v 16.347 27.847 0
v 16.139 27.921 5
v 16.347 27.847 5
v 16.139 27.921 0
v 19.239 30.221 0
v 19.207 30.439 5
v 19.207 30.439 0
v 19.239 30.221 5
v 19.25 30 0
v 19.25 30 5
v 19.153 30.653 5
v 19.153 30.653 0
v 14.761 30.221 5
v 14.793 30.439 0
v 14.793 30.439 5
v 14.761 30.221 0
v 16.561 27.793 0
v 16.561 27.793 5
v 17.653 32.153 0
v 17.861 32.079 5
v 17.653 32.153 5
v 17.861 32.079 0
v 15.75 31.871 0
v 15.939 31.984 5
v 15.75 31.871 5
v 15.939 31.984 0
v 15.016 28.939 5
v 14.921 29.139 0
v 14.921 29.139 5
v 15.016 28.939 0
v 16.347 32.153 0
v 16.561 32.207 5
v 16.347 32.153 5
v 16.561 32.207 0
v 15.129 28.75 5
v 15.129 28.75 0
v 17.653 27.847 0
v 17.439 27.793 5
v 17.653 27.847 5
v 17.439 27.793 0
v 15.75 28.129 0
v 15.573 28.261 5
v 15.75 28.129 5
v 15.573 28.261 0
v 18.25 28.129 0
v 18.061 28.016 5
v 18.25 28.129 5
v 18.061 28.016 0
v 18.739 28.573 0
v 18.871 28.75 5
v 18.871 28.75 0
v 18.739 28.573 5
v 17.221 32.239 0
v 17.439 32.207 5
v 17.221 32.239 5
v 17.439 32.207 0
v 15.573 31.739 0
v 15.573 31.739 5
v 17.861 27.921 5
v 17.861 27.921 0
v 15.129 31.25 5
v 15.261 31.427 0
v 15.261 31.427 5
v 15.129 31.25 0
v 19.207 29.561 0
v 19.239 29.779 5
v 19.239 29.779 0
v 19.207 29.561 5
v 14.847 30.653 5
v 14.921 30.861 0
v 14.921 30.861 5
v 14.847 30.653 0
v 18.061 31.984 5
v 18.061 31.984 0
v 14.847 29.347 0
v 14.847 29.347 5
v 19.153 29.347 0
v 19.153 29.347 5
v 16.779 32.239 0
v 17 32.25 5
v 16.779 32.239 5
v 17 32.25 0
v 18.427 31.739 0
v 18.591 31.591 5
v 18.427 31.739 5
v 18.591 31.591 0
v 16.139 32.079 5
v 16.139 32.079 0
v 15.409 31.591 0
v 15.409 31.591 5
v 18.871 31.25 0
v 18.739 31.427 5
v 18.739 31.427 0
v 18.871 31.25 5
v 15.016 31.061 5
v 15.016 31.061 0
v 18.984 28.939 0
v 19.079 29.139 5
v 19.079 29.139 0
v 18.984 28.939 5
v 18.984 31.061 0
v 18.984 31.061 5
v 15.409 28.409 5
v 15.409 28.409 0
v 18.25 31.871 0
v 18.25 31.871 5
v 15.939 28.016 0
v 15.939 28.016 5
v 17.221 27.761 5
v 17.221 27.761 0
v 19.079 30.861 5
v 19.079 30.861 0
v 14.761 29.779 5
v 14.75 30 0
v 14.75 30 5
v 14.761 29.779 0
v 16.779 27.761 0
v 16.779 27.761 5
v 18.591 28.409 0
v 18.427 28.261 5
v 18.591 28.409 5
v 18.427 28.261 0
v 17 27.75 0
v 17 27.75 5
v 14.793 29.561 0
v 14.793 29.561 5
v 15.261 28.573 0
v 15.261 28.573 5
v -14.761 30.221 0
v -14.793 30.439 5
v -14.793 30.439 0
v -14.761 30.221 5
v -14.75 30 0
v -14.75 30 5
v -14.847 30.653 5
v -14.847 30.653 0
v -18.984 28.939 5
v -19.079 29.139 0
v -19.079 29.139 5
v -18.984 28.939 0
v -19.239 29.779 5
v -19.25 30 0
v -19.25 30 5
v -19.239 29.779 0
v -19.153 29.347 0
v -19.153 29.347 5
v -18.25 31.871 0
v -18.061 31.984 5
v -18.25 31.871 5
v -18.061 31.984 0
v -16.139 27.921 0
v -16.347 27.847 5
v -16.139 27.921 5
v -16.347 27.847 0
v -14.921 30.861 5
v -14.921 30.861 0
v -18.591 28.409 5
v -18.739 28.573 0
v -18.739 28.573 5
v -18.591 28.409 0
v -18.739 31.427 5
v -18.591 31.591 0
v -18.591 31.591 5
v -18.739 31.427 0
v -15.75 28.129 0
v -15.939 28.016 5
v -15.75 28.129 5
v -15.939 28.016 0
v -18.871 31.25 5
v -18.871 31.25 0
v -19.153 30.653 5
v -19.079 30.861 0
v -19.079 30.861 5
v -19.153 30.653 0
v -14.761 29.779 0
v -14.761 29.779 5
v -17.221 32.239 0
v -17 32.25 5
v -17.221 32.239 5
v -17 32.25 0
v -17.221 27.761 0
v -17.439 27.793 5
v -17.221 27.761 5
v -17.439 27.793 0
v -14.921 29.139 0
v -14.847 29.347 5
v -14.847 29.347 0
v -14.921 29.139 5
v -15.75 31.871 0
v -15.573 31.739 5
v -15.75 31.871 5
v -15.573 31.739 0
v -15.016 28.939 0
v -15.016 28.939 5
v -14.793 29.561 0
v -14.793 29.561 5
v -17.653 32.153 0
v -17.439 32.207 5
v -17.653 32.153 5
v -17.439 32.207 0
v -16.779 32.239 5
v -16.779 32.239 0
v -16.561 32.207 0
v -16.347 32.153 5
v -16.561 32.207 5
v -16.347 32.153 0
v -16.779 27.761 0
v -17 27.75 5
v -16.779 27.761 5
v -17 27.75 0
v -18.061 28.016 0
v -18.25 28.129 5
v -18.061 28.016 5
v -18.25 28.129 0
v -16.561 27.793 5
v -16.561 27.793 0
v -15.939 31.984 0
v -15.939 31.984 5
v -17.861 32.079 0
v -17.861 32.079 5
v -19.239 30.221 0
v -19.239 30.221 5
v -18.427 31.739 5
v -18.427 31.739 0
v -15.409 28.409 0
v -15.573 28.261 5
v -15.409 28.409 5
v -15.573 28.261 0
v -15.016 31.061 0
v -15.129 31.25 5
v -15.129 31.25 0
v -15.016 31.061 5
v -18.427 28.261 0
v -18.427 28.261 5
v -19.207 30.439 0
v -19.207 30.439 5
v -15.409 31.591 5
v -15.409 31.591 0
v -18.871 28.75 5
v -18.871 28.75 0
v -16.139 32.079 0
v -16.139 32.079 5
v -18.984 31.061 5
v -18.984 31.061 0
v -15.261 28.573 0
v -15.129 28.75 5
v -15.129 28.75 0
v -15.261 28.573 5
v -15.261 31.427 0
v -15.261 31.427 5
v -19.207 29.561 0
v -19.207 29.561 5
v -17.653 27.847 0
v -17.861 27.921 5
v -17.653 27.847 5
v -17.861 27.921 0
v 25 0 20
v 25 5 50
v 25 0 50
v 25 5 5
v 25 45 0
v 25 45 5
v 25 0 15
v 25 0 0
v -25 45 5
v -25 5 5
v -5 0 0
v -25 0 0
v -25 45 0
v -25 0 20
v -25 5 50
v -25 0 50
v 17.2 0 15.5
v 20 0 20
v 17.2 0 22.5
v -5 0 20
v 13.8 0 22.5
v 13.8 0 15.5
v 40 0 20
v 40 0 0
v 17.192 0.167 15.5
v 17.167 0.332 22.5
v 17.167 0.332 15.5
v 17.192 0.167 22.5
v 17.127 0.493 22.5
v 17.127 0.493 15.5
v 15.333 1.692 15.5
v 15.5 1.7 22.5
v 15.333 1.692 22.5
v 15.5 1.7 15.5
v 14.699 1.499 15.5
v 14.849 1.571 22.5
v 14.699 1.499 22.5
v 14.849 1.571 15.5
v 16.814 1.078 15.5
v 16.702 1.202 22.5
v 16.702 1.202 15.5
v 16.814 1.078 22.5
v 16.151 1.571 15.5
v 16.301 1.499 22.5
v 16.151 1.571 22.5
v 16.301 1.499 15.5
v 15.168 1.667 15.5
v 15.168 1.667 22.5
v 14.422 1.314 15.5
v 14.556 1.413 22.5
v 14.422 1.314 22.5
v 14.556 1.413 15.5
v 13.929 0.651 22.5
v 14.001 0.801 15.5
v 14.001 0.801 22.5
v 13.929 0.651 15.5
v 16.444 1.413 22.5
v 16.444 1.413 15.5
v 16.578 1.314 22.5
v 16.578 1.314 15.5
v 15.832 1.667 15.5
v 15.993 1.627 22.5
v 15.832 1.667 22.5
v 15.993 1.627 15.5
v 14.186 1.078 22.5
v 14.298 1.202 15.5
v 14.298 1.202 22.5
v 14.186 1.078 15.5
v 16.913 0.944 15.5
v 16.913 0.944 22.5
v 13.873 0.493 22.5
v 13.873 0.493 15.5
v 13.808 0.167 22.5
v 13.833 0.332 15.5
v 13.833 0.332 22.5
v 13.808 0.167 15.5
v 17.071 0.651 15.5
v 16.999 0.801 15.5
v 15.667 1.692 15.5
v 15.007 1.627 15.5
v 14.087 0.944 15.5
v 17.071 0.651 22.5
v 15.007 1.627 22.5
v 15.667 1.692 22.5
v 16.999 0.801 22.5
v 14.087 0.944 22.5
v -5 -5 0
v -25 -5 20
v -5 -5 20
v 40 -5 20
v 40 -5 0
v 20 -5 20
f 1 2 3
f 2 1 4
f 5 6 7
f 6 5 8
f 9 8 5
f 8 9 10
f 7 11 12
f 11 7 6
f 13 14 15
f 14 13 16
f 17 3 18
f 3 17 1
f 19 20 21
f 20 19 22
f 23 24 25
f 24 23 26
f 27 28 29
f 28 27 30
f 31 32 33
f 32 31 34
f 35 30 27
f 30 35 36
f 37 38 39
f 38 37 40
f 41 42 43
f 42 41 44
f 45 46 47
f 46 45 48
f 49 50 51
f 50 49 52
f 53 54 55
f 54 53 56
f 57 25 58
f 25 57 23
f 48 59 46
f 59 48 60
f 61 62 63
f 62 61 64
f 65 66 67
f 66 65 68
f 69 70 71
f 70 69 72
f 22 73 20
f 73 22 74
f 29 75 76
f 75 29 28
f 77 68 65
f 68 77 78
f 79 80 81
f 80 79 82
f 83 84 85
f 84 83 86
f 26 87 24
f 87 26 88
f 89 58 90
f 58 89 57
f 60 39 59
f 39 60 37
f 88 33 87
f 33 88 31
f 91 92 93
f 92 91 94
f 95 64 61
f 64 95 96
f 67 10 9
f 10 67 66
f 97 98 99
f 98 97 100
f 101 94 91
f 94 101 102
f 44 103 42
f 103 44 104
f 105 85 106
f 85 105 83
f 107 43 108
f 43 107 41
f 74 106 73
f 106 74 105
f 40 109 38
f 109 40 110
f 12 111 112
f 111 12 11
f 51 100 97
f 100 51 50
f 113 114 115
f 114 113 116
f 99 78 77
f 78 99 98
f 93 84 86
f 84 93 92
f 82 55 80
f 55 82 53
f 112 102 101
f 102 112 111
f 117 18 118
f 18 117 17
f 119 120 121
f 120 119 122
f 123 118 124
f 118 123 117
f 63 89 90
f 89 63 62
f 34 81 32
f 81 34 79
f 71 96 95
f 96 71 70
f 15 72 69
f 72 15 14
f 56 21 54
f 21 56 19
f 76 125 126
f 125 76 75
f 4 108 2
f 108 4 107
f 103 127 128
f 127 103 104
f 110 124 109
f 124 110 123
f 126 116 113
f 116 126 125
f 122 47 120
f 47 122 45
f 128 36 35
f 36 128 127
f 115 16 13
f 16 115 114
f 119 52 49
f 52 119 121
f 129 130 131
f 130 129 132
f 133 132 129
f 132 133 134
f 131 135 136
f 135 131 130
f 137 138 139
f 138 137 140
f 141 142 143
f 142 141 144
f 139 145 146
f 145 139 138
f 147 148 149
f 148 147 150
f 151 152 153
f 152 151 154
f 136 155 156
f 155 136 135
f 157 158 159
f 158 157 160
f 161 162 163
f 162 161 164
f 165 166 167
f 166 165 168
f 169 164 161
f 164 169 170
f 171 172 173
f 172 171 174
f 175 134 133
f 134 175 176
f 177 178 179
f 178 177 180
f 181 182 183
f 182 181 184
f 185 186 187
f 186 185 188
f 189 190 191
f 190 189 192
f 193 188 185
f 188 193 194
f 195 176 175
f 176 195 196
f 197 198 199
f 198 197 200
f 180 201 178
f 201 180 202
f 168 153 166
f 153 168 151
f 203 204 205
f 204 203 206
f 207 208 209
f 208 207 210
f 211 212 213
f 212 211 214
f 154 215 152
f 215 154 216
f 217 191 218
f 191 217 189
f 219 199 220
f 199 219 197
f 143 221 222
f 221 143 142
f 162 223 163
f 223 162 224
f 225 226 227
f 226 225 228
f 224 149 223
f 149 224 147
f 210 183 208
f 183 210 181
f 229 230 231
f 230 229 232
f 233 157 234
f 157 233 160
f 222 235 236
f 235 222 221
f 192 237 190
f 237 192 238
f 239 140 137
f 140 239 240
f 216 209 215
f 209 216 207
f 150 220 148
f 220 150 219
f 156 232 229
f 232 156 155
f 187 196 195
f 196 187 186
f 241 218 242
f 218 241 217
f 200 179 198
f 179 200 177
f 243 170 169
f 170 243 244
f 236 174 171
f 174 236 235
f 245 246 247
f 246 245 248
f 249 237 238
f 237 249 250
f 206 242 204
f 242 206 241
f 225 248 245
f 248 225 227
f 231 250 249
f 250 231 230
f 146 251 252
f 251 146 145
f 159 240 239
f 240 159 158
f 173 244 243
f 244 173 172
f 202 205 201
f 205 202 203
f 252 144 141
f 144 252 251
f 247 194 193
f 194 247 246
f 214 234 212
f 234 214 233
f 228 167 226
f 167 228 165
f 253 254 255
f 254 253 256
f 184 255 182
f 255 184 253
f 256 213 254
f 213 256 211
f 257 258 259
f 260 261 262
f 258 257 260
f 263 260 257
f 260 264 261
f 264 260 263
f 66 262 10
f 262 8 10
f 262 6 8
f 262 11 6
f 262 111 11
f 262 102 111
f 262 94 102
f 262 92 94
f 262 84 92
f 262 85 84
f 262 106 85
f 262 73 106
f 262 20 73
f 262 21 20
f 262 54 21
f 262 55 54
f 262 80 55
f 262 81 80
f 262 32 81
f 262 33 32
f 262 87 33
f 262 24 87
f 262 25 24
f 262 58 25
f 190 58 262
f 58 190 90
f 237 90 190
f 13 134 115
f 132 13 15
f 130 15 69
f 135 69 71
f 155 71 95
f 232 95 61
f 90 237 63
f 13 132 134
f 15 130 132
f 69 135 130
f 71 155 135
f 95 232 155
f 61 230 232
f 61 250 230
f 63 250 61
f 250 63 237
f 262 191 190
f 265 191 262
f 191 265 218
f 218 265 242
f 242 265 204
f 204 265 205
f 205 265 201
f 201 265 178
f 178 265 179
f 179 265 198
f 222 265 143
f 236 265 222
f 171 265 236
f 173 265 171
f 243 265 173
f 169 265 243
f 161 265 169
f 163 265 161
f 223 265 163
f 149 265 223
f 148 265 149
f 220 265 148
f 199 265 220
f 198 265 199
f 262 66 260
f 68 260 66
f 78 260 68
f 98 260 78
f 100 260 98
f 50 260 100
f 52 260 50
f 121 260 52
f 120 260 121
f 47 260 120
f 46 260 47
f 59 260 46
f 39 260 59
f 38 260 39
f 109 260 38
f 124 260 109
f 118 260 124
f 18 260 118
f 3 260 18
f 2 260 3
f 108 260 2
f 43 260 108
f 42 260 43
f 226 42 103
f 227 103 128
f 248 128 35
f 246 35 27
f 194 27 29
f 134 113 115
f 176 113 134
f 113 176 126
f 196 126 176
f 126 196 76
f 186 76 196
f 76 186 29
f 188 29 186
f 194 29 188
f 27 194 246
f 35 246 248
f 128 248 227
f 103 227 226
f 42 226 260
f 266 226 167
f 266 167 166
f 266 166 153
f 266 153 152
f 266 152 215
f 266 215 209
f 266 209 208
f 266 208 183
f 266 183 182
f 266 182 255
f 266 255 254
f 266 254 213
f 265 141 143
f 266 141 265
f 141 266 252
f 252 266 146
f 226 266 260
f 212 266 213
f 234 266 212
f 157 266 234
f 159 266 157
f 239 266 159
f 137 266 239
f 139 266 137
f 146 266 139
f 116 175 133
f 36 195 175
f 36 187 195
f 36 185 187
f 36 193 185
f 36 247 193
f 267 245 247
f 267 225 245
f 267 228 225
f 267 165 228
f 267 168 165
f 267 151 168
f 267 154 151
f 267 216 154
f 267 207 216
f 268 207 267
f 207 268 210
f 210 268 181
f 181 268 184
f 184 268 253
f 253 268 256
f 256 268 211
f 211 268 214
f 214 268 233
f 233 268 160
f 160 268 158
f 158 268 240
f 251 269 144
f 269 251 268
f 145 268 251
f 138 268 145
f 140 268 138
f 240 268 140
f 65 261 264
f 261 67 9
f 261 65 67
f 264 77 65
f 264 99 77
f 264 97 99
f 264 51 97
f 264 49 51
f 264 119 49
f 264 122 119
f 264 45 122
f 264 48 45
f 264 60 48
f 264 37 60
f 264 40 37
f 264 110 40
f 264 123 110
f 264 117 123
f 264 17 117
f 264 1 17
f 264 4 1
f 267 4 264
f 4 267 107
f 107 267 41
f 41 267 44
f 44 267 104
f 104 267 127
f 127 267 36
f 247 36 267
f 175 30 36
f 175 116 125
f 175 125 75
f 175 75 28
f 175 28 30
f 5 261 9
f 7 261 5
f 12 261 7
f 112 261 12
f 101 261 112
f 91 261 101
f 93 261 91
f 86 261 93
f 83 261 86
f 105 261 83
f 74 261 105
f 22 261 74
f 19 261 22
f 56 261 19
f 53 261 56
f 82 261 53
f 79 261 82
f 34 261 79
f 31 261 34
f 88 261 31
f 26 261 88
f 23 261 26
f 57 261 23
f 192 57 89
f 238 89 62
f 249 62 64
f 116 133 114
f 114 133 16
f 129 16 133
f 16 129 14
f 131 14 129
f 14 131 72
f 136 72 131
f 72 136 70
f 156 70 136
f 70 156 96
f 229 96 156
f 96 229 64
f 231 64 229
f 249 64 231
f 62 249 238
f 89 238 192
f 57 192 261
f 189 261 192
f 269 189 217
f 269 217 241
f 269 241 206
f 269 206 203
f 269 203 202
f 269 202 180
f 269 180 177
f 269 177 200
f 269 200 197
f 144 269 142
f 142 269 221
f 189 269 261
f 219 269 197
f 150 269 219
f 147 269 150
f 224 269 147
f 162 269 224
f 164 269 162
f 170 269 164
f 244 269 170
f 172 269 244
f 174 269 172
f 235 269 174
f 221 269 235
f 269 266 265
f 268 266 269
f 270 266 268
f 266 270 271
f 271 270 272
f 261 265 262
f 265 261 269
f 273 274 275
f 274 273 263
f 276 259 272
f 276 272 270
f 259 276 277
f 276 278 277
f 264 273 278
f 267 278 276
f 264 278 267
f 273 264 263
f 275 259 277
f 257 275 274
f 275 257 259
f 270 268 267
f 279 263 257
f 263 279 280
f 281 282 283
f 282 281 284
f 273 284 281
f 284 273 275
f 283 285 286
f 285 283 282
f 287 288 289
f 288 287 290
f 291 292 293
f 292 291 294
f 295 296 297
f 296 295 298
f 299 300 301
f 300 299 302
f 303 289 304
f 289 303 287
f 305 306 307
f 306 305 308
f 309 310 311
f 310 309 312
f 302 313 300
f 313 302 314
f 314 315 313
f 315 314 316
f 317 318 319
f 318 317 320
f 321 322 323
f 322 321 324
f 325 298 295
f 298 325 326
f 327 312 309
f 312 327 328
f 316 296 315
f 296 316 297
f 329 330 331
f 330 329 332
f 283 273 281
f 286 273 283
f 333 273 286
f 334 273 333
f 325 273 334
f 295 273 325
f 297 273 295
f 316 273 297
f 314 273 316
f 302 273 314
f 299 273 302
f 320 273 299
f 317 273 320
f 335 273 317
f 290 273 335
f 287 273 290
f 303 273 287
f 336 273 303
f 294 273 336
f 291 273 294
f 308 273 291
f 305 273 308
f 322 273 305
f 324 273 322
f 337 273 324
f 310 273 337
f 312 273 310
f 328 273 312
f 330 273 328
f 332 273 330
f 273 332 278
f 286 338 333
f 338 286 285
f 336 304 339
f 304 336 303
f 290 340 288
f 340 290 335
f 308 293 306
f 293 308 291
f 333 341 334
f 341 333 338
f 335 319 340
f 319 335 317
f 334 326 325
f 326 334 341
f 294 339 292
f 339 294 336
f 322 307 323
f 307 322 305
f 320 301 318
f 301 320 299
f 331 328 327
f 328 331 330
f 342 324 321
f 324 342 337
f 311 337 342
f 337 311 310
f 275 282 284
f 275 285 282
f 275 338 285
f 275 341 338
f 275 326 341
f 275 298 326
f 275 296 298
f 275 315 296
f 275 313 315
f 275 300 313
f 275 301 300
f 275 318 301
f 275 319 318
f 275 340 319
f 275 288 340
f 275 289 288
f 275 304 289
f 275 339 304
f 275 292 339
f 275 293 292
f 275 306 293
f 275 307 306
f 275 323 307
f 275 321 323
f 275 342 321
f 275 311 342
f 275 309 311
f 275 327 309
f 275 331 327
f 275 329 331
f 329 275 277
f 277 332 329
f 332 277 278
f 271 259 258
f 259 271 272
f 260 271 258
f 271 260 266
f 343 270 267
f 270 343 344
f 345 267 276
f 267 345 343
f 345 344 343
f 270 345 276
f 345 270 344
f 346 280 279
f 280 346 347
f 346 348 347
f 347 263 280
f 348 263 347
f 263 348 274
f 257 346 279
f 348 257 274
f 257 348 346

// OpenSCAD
// L-shaped mounting bracket for NEMA 17 stepper motor
// Print orientation: base plate on bed, motor plate builds upward (+Z)

// ---------------- Parameters ----------------
$fn = 64;

// Base plate
base_x0 = -25;   // base plate X start
base_x1 = 25;    // base plate X end
base_y0 = 0;     // base plate Y start
base_y1 = 45;    // base plate Y end
base_z0 = 0;     // base plate Z start
base_z1 = 5;     // base plate Z end
hole_m4_x = -17; // M4 hole X position (both holes)
hole_m4_y = 30;  // M4 hole Y position (both holes)
hole_m4_d = 4.5; // M4 hole diameter

// Motor plate
motor_x0 = -25;  // motor plate X start
motor_x1 = 25;   // motor plate X end
motor_y0 = 0;    // motor plate Y start
motor_y1 = 5;    // motor plate Y end
motor_z0 = 0;    // motor plate Z start
motor_z1 = 50;   // motor plate Z end
boss_hole_d = 23; // motor centring boss hole diameter
boss_hole_x = 0;  // boss hole X centre
boss_hole_z = 28; // boss hole Z centre
screw_d = 3.4;    // M3 screw hole diameter
screw_pattern = 31; // square pitch for screw holes
screw_count = 4;   // number of screw holes

// Gussets
gusset_t = 5;     // gusset thickness (along X)
gusset_leg = 20;  // right triangle leg lengths (along Y and Z)
gusset_x0 = -25;  // gusset X start (left edge)
gusset_x1 = -20;  // gusset X end (left gusset)
// right gusset starts at x = 20 and runs to the right edge
gusset_r_x0 = 20;

// ---------------- Model ----------------
union() {
    // Base plate with M4 through-holes
    difference() {
        translate([base_x0, base_y0, base_z0])
            cube([base_x1 - base_x0, base_y1 - base_y0, base_z1 - base_z0]);
        for (sx = [-1, 1])
            translate([sx * hole_m4_x, hole_m4_y, -1])
                cylinder(d = hole_m4_d, h = base_z1 + 2);
    }

    // Motor plate standing on the back edge of the base
    difference() {
        translate([motor_x0, motor_y0, motor_z0])
            cube([motor_x1 - motor_x0, motor_y1 - motor_y0, motor_z1 - motor_z0]);
        // Boss hole along Y, centred at x = 0, z = 28
        translate([boss_hole_x, -1, boss_hole_z])
            rotate([90, 0, 0])
                cylinder(d = boss_hole_d, h = motor_y1 - motor_y0 + 2);
        // M3 screw holes on a square pattern centred on the boss hole
        for (i = [0 : screw_count - 1]) {
            a = (i < 2) ? -screw_pattern / 2 : screw_pattern / 2;
            b = (i < 2) ? -screw_pattern / 2 : screw_pattern / 2;
            translate([a, 0, b])
                cylinder(d = screw_d, h = motor_y1 - motor_y0 + 2);
        }
    }

    // Triangular gussets flush with the left and right edges
    // Right triangle in YZ: legs along +Y and +Z, right angle at y = 5, z = 5
    for (gx = [gusset_x0, gusset_r_x0]) {
        translate([gx, 0, 0])
            rotate([90, 0, 0])
                linear_extrude(height = gusset_t)
                    polygon(points = [
                        [gusset_leg, gusset_leg],
                        [gusset_leg, 0],
                        [0, gusset_leg]
                    ]);
    }
}
